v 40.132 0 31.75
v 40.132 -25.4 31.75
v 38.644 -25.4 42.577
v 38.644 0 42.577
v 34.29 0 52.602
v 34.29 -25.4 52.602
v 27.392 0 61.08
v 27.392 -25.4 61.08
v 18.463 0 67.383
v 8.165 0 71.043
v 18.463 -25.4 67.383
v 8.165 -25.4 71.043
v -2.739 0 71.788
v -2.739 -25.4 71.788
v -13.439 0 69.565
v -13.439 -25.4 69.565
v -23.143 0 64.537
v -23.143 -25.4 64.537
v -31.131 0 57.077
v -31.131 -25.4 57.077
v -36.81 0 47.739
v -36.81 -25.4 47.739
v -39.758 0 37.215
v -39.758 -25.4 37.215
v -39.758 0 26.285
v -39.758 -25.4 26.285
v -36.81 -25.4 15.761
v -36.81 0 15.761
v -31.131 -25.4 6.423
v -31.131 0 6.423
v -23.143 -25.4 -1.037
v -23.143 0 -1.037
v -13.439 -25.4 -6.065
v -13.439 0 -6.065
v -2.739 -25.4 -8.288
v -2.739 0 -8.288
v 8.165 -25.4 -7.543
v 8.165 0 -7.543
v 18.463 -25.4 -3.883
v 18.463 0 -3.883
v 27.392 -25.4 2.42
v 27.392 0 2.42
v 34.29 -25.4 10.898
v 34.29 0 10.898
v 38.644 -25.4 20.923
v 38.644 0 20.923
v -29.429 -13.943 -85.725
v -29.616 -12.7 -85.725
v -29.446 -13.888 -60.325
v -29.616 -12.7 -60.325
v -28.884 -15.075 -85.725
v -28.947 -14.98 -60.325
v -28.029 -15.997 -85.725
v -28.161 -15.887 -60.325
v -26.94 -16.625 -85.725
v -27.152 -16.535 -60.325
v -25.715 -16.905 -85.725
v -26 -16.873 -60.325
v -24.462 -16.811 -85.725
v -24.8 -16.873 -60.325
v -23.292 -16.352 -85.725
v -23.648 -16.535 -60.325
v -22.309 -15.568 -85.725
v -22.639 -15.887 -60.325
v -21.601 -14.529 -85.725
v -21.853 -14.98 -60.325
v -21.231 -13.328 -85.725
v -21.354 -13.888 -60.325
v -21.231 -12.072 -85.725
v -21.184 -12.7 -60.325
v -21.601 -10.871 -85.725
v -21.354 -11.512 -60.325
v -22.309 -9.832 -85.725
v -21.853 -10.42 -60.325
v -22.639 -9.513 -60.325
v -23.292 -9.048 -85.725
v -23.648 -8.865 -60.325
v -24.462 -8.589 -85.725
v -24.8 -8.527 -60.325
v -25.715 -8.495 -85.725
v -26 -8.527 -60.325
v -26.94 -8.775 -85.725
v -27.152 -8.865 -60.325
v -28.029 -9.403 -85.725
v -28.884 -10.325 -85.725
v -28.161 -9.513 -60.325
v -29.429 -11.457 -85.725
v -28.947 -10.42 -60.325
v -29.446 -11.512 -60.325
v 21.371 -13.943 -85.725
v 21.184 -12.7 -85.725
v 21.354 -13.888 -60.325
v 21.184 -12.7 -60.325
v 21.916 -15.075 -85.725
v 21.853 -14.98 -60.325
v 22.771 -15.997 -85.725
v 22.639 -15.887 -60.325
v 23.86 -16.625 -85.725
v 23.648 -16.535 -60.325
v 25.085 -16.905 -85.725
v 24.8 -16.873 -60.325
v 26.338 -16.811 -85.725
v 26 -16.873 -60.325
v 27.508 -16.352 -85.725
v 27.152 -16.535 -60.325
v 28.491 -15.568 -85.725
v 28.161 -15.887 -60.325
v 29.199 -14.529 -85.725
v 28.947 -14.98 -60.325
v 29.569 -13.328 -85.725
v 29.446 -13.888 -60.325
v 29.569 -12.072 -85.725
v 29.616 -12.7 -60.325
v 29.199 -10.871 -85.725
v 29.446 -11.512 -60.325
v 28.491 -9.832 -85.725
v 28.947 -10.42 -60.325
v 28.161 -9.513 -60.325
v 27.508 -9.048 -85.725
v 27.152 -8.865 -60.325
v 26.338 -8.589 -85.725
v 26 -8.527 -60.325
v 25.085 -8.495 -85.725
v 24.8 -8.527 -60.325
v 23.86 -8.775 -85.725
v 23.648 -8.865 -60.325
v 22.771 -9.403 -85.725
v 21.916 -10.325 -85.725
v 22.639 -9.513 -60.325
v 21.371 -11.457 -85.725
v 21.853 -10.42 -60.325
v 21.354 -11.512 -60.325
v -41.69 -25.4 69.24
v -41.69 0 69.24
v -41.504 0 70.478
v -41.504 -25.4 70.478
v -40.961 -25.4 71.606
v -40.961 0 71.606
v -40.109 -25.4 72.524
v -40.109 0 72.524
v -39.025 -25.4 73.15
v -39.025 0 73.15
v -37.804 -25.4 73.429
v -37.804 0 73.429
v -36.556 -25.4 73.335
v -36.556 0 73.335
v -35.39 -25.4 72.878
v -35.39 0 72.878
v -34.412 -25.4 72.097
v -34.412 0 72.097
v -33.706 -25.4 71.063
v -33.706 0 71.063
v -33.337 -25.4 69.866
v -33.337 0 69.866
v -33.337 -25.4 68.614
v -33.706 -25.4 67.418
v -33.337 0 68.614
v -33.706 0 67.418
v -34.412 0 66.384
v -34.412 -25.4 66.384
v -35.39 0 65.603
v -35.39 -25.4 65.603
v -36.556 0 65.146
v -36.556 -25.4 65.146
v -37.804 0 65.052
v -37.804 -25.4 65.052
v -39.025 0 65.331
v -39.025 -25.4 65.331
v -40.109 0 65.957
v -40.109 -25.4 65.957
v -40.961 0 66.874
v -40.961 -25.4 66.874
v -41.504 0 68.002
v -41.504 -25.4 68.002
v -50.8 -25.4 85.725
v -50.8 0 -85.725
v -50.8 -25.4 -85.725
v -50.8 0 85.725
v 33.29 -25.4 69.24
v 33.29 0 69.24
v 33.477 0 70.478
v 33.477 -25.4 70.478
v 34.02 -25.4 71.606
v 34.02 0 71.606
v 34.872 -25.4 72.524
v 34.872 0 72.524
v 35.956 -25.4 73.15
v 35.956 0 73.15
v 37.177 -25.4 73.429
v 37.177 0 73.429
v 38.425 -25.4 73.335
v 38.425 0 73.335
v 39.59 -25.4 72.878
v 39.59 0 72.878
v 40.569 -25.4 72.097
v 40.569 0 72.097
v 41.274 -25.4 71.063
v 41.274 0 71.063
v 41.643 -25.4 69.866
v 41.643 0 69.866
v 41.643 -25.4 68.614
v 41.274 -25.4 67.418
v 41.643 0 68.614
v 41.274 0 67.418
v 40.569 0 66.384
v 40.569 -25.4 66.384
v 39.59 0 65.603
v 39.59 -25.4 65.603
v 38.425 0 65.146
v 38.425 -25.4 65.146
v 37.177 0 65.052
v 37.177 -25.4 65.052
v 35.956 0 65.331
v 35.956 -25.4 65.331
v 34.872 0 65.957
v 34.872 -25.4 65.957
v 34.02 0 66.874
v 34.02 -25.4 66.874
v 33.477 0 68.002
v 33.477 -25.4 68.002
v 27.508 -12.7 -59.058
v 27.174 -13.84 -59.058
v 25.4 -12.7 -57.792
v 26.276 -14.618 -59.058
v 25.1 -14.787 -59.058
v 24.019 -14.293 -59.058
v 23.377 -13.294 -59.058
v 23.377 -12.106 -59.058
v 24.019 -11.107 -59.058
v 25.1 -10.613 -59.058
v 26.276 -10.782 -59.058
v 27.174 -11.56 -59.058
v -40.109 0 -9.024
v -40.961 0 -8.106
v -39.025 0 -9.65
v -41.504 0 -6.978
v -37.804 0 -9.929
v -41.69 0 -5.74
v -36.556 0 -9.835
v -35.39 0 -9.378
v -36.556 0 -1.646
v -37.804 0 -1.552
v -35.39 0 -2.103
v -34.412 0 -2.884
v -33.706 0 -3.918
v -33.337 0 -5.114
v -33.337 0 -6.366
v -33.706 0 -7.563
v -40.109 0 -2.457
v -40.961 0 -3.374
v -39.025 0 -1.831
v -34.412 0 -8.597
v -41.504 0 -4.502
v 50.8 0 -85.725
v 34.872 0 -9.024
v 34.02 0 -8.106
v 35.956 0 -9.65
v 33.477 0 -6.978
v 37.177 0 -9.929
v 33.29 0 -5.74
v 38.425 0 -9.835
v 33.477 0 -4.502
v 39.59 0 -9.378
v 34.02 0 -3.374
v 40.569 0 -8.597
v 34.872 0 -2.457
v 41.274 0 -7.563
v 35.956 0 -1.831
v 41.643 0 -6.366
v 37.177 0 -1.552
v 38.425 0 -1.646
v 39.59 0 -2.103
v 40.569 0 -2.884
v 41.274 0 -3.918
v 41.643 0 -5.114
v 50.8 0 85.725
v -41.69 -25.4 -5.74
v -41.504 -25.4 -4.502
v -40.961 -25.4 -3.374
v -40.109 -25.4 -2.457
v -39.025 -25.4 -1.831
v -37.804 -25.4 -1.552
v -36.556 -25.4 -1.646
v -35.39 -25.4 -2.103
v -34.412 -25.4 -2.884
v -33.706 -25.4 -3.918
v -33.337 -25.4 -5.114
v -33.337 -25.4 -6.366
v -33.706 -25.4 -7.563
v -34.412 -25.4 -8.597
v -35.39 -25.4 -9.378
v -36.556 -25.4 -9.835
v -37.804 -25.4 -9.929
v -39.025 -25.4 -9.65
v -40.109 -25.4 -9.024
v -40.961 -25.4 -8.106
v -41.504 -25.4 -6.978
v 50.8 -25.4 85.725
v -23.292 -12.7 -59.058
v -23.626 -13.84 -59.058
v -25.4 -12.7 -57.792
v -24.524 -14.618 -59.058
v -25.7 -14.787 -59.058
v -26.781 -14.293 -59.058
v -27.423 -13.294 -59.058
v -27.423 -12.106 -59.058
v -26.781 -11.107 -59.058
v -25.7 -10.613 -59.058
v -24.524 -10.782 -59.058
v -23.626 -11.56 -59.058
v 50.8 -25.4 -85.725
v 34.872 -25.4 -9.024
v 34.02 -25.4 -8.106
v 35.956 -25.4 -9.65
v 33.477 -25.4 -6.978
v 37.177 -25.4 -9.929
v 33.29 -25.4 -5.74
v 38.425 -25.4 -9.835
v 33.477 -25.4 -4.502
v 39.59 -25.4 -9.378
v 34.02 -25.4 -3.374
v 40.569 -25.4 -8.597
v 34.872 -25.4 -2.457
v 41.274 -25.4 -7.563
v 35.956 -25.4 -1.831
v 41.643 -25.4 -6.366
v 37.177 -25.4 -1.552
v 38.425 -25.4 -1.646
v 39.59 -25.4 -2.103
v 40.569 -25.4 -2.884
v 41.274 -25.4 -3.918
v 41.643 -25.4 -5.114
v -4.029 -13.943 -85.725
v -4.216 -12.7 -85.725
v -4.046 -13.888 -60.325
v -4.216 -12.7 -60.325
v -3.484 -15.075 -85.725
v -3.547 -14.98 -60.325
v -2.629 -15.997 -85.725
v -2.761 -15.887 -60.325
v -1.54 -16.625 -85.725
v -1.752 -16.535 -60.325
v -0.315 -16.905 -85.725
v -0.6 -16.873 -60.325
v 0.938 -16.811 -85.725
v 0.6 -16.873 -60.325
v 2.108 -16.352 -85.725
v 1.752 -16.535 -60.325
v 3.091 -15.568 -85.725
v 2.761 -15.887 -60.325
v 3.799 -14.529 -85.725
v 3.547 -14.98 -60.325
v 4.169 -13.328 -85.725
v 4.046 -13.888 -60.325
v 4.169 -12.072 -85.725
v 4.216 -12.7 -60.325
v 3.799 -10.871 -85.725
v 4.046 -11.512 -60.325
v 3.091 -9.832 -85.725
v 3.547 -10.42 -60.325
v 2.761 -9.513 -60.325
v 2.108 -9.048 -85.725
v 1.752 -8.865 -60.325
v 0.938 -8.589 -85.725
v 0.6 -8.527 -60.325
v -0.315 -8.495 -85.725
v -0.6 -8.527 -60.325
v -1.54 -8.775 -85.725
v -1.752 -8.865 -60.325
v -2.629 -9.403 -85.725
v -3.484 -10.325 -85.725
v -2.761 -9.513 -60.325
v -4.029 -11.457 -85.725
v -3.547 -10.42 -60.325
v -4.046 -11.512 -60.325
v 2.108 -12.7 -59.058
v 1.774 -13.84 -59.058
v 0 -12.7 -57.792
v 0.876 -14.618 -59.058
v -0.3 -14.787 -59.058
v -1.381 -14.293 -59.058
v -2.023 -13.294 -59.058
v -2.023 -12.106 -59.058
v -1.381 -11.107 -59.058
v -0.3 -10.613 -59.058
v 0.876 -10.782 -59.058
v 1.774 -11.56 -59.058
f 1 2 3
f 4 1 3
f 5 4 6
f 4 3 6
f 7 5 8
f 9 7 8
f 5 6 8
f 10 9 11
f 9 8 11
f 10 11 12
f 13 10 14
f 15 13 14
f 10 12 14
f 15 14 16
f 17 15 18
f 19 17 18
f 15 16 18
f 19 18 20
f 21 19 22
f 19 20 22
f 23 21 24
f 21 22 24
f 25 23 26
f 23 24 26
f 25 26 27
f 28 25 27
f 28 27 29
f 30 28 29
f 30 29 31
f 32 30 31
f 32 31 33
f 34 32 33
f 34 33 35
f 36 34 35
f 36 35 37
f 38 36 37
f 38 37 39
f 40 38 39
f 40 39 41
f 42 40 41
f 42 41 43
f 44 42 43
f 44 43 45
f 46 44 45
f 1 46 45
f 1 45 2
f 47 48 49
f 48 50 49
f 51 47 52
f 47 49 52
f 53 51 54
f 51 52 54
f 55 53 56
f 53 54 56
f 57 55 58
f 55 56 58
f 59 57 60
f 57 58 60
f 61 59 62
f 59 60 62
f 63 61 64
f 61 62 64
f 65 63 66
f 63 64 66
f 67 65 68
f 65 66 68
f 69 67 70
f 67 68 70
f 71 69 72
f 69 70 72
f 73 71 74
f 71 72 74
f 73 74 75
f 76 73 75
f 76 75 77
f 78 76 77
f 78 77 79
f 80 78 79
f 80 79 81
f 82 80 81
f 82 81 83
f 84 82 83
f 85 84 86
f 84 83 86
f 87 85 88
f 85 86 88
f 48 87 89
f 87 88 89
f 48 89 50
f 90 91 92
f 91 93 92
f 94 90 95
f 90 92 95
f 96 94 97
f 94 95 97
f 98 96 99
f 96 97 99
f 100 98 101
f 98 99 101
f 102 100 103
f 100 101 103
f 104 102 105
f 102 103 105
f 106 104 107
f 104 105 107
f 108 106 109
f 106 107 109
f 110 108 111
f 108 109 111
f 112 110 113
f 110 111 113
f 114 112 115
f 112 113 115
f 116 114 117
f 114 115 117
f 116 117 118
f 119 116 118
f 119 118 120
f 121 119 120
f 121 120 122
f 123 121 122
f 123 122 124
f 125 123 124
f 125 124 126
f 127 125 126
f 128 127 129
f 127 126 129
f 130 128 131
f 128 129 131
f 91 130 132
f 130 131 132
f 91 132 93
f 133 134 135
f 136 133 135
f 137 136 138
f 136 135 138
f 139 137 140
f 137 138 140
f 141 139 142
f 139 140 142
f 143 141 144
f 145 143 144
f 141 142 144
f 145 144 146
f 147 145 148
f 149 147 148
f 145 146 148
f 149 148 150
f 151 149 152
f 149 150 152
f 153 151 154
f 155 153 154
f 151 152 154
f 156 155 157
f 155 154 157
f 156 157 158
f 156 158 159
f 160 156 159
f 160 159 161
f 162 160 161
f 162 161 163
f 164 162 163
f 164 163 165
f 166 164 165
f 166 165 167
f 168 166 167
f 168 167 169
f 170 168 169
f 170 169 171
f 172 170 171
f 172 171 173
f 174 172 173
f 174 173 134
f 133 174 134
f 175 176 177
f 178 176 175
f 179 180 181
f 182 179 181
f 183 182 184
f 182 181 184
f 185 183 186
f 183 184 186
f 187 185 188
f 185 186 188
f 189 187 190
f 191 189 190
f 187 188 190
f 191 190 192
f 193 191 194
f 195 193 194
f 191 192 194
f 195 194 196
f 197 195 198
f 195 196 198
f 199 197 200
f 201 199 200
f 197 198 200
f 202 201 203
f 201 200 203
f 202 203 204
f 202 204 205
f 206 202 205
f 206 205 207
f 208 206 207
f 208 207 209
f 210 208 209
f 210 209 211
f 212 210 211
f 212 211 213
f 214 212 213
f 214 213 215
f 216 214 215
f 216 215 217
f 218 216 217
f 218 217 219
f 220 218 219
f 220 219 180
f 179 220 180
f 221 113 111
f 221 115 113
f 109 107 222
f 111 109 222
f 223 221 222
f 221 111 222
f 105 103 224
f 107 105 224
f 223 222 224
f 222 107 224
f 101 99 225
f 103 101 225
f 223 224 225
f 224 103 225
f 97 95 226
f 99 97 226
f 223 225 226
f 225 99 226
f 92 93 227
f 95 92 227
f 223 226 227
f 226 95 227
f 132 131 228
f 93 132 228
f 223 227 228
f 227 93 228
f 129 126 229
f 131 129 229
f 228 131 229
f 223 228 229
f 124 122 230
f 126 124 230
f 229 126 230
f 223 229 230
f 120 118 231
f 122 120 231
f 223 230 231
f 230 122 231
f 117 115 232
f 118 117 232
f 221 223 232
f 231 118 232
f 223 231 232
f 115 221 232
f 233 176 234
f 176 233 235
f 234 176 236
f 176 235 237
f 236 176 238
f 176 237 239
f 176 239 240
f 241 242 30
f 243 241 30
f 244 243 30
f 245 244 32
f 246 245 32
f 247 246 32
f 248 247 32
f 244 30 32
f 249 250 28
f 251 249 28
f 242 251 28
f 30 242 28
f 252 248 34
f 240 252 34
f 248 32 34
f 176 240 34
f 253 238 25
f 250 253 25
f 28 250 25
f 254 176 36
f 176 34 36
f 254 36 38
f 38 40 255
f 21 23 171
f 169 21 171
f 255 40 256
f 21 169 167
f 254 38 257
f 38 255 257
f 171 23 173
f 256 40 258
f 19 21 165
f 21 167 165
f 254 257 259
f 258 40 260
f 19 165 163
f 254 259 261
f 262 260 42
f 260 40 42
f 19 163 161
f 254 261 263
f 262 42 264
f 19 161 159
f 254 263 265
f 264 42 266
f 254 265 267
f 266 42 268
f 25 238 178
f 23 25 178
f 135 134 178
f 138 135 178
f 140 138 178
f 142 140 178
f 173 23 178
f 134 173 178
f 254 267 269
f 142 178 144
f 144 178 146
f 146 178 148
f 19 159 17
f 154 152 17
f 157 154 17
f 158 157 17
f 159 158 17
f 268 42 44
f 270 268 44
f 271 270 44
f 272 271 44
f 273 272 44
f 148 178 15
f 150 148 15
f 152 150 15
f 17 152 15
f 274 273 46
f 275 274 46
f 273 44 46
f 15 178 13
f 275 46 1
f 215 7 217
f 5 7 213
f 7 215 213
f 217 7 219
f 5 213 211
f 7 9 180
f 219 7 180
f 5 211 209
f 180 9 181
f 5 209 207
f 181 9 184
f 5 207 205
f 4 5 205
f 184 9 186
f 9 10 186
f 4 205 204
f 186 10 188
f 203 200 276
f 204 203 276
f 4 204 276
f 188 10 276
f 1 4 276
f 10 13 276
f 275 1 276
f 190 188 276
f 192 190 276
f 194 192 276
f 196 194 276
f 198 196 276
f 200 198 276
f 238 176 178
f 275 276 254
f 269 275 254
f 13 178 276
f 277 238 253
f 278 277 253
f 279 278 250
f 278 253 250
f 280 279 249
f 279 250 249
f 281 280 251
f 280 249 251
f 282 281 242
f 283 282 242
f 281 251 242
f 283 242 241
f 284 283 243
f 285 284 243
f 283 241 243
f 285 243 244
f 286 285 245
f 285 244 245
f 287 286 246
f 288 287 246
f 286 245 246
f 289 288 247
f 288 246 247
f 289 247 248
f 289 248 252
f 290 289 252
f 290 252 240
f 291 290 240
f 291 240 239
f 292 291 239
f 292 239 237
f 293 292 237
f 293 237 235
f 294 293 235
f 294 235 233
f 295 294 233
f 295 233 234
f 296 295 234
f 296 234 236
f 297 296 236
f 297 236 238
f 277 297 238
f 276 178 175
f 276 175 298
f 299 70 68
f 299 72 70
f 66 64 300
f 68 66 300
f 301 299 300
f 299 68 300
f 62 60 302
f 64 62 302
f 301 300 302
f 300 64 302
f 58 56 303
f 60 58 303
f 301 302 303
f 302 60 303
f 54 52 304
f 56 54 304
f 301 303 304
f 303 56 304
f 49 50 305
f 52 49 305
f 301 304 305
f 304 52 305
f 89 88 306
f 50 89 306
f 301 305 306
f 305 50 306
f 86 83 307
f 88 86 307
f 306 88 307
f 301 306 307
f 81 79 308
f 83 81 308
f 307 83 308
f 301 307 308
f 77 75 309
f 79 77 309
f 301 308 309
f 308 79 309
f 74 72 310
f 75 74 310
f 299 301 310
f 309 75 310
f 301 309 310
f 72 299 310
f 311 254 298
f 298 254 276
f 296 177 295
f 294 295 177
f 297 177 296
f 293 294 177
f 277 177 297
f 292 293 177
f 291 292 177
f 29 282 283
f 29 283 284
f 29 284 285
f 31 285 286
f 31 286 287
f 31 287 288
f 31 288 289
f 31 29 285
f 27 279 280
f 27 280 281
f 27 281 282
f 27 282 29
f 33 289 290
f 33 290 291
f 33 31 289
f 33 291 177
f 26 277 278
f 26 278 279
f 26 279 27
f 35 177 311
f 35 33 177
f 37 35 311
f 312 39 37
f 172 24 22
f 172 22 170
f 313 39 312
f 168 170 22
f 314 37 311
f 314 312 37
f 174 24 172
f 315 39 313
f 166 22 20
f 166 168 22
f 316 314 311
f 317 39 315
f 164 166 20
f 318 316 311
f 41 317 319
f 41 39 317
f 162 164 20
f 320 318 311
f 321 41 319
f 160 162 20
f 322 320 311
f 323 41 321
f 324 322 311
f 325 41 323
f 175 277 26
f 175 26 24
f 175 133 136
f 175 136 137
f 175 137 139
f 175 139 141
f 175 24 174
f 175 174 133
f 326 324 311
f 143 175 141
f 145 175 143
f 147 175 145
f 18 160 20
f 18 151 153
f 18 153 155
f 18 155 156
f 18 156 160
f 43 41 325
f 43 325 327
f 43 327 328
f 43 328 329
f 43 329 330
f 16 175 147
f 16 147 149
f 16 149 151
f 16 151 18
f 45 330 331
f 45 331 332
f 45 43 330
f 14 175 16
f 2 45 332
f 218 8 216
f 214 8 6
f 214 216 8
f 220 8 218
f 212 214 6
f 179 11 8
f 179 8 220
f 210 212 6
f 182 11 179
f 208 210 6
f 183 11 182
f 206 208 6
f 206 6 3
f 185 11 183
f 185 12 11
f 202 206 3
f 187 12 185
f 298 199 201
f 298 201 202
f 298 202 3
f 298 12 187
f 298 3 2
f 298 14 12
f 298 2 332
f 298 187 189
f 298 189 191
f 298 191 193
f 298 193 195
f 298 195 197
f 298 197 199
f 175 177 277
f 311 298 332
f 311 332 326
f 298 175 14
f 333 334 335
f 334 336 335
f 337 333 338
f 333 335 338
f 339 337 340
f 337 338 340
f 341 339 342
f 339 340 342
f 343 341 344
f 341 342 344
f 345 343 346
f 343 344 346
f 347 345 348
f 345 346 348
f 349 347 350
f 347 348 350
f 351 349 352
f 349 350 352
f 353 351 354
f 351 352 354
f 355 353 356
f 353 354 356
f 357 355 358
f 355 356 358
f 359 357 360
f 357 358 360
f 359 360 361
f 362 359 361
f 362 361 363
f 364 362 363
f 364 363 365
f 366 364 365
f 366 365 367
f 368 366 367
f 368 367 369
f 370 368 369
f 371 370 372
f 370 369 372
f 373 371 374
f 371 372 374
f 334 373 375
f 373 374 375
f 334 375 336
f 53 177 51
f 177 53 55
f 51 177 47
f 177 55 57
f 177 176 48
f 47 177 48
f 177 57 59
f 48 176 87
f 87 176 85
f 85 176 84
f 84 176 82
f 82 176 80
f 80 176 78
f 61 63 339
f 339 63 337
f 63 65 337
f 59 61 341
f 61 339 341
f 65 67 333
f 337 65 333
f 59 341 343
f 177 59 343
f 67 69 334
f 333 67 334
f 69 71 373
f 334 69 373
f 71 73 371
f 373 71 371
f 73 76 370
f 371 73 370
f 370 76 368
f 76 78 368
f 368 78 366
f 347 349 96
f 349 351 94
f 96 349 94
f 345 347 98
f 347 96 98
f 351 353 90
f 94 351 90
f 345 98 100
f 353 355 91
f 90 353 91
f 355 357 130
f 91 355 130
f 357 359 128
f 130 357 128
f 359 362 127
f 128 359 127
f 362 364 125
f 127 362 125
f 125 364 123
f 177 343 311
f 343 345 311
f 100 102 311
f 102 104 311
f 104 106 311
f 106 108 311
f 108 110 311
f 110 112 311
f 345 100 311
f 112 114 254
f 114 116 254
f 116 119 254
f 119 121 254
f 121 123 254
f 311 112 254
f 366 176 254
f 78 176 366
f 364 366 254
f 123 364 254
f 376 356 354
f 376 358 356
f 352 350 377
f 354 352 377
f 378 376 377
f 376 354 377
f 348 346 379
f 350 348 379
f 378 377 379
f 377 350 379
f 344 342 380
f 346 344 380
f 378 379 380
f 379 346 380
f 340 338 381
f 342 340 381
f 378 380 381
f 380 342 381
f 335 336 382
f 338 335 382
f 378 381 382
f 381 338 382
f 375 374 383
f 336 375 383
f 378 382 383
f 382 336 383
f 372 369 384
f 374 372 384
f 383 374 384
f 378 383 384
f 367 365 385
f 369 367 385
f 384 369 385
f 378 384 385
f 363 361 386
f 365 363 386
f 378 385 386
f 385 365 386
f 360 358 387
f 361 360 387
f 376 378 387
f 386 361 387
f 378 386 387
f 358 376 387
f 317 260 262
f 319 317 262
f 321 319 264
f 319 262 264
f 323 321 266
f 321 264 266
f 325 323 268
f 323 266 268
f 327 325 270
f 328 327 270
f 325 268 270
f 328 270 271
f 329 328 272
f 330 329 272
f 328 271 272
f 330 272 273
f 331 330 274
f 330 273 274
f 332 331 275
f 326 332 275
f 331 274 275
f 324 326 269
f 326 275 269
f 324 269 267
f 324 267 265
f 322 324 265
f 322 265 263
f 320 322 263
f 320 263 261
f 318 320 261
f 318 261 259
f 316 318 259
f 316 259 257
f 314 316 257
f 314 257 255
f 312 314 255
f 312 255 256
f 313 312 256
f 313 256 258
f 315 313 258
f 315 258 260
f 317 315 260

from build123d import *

# Parameters (mm, degrees)
F0_W     = 101.6
F0_H     = 171.45
F1_DEPTH = 25.4
F3_D     = 8.4328
F3_DEPTH = 25.4
F3_TIP   = 2.5334687141
F4_R     = 40.132
F5_DEPTH = 25.401
F7_D     = 8.4


with BuildPart() as f1:
    # F0 (on Front) → F1 (new body)
    with BuildSketch(Plane.XZ):
        Rectangle(F0_W, F0_H)
    extrude(amount=F1_DEPTH)

    # F3
    with Locations(Plane(origin=(0, 0, -85.725), x_dir=(1, 0, 0), z_dir=(0, 0, -1))):
        with Locations((-25.4, 12.7), (25.4, 12.7), (0, 12.7)):
            Hole(F3_D / 2, depth=F3_DEPTH)
            with Locations((0, 0, -(F3_DEPTH + F3_TIP / 2))):  # 118° drill point
                Cone(0, F3_D / 2, F3_TIP, mode=Mode.SUBTRACT)

    # F4 (on face) → F5 (cut, through all)
    with BuildSketch(Plane.XZ.offset(25.4)):
        with Locations((0, 31.75)):
            Circle(F4_R)
    extrude(amount=-F5_DEPTH, mode=Mode.SUBTRACT)

    # F7 (through all)
    with Locations(Plane.XZ.offset(25.4)):
        with Locations((-37.4904, 69.2404), (37.4904, 69.2404), (37.4904, -5.7404), (-37.4904, -5.7404)):
            Hole(F7_D / 2)


solid = f1.part
